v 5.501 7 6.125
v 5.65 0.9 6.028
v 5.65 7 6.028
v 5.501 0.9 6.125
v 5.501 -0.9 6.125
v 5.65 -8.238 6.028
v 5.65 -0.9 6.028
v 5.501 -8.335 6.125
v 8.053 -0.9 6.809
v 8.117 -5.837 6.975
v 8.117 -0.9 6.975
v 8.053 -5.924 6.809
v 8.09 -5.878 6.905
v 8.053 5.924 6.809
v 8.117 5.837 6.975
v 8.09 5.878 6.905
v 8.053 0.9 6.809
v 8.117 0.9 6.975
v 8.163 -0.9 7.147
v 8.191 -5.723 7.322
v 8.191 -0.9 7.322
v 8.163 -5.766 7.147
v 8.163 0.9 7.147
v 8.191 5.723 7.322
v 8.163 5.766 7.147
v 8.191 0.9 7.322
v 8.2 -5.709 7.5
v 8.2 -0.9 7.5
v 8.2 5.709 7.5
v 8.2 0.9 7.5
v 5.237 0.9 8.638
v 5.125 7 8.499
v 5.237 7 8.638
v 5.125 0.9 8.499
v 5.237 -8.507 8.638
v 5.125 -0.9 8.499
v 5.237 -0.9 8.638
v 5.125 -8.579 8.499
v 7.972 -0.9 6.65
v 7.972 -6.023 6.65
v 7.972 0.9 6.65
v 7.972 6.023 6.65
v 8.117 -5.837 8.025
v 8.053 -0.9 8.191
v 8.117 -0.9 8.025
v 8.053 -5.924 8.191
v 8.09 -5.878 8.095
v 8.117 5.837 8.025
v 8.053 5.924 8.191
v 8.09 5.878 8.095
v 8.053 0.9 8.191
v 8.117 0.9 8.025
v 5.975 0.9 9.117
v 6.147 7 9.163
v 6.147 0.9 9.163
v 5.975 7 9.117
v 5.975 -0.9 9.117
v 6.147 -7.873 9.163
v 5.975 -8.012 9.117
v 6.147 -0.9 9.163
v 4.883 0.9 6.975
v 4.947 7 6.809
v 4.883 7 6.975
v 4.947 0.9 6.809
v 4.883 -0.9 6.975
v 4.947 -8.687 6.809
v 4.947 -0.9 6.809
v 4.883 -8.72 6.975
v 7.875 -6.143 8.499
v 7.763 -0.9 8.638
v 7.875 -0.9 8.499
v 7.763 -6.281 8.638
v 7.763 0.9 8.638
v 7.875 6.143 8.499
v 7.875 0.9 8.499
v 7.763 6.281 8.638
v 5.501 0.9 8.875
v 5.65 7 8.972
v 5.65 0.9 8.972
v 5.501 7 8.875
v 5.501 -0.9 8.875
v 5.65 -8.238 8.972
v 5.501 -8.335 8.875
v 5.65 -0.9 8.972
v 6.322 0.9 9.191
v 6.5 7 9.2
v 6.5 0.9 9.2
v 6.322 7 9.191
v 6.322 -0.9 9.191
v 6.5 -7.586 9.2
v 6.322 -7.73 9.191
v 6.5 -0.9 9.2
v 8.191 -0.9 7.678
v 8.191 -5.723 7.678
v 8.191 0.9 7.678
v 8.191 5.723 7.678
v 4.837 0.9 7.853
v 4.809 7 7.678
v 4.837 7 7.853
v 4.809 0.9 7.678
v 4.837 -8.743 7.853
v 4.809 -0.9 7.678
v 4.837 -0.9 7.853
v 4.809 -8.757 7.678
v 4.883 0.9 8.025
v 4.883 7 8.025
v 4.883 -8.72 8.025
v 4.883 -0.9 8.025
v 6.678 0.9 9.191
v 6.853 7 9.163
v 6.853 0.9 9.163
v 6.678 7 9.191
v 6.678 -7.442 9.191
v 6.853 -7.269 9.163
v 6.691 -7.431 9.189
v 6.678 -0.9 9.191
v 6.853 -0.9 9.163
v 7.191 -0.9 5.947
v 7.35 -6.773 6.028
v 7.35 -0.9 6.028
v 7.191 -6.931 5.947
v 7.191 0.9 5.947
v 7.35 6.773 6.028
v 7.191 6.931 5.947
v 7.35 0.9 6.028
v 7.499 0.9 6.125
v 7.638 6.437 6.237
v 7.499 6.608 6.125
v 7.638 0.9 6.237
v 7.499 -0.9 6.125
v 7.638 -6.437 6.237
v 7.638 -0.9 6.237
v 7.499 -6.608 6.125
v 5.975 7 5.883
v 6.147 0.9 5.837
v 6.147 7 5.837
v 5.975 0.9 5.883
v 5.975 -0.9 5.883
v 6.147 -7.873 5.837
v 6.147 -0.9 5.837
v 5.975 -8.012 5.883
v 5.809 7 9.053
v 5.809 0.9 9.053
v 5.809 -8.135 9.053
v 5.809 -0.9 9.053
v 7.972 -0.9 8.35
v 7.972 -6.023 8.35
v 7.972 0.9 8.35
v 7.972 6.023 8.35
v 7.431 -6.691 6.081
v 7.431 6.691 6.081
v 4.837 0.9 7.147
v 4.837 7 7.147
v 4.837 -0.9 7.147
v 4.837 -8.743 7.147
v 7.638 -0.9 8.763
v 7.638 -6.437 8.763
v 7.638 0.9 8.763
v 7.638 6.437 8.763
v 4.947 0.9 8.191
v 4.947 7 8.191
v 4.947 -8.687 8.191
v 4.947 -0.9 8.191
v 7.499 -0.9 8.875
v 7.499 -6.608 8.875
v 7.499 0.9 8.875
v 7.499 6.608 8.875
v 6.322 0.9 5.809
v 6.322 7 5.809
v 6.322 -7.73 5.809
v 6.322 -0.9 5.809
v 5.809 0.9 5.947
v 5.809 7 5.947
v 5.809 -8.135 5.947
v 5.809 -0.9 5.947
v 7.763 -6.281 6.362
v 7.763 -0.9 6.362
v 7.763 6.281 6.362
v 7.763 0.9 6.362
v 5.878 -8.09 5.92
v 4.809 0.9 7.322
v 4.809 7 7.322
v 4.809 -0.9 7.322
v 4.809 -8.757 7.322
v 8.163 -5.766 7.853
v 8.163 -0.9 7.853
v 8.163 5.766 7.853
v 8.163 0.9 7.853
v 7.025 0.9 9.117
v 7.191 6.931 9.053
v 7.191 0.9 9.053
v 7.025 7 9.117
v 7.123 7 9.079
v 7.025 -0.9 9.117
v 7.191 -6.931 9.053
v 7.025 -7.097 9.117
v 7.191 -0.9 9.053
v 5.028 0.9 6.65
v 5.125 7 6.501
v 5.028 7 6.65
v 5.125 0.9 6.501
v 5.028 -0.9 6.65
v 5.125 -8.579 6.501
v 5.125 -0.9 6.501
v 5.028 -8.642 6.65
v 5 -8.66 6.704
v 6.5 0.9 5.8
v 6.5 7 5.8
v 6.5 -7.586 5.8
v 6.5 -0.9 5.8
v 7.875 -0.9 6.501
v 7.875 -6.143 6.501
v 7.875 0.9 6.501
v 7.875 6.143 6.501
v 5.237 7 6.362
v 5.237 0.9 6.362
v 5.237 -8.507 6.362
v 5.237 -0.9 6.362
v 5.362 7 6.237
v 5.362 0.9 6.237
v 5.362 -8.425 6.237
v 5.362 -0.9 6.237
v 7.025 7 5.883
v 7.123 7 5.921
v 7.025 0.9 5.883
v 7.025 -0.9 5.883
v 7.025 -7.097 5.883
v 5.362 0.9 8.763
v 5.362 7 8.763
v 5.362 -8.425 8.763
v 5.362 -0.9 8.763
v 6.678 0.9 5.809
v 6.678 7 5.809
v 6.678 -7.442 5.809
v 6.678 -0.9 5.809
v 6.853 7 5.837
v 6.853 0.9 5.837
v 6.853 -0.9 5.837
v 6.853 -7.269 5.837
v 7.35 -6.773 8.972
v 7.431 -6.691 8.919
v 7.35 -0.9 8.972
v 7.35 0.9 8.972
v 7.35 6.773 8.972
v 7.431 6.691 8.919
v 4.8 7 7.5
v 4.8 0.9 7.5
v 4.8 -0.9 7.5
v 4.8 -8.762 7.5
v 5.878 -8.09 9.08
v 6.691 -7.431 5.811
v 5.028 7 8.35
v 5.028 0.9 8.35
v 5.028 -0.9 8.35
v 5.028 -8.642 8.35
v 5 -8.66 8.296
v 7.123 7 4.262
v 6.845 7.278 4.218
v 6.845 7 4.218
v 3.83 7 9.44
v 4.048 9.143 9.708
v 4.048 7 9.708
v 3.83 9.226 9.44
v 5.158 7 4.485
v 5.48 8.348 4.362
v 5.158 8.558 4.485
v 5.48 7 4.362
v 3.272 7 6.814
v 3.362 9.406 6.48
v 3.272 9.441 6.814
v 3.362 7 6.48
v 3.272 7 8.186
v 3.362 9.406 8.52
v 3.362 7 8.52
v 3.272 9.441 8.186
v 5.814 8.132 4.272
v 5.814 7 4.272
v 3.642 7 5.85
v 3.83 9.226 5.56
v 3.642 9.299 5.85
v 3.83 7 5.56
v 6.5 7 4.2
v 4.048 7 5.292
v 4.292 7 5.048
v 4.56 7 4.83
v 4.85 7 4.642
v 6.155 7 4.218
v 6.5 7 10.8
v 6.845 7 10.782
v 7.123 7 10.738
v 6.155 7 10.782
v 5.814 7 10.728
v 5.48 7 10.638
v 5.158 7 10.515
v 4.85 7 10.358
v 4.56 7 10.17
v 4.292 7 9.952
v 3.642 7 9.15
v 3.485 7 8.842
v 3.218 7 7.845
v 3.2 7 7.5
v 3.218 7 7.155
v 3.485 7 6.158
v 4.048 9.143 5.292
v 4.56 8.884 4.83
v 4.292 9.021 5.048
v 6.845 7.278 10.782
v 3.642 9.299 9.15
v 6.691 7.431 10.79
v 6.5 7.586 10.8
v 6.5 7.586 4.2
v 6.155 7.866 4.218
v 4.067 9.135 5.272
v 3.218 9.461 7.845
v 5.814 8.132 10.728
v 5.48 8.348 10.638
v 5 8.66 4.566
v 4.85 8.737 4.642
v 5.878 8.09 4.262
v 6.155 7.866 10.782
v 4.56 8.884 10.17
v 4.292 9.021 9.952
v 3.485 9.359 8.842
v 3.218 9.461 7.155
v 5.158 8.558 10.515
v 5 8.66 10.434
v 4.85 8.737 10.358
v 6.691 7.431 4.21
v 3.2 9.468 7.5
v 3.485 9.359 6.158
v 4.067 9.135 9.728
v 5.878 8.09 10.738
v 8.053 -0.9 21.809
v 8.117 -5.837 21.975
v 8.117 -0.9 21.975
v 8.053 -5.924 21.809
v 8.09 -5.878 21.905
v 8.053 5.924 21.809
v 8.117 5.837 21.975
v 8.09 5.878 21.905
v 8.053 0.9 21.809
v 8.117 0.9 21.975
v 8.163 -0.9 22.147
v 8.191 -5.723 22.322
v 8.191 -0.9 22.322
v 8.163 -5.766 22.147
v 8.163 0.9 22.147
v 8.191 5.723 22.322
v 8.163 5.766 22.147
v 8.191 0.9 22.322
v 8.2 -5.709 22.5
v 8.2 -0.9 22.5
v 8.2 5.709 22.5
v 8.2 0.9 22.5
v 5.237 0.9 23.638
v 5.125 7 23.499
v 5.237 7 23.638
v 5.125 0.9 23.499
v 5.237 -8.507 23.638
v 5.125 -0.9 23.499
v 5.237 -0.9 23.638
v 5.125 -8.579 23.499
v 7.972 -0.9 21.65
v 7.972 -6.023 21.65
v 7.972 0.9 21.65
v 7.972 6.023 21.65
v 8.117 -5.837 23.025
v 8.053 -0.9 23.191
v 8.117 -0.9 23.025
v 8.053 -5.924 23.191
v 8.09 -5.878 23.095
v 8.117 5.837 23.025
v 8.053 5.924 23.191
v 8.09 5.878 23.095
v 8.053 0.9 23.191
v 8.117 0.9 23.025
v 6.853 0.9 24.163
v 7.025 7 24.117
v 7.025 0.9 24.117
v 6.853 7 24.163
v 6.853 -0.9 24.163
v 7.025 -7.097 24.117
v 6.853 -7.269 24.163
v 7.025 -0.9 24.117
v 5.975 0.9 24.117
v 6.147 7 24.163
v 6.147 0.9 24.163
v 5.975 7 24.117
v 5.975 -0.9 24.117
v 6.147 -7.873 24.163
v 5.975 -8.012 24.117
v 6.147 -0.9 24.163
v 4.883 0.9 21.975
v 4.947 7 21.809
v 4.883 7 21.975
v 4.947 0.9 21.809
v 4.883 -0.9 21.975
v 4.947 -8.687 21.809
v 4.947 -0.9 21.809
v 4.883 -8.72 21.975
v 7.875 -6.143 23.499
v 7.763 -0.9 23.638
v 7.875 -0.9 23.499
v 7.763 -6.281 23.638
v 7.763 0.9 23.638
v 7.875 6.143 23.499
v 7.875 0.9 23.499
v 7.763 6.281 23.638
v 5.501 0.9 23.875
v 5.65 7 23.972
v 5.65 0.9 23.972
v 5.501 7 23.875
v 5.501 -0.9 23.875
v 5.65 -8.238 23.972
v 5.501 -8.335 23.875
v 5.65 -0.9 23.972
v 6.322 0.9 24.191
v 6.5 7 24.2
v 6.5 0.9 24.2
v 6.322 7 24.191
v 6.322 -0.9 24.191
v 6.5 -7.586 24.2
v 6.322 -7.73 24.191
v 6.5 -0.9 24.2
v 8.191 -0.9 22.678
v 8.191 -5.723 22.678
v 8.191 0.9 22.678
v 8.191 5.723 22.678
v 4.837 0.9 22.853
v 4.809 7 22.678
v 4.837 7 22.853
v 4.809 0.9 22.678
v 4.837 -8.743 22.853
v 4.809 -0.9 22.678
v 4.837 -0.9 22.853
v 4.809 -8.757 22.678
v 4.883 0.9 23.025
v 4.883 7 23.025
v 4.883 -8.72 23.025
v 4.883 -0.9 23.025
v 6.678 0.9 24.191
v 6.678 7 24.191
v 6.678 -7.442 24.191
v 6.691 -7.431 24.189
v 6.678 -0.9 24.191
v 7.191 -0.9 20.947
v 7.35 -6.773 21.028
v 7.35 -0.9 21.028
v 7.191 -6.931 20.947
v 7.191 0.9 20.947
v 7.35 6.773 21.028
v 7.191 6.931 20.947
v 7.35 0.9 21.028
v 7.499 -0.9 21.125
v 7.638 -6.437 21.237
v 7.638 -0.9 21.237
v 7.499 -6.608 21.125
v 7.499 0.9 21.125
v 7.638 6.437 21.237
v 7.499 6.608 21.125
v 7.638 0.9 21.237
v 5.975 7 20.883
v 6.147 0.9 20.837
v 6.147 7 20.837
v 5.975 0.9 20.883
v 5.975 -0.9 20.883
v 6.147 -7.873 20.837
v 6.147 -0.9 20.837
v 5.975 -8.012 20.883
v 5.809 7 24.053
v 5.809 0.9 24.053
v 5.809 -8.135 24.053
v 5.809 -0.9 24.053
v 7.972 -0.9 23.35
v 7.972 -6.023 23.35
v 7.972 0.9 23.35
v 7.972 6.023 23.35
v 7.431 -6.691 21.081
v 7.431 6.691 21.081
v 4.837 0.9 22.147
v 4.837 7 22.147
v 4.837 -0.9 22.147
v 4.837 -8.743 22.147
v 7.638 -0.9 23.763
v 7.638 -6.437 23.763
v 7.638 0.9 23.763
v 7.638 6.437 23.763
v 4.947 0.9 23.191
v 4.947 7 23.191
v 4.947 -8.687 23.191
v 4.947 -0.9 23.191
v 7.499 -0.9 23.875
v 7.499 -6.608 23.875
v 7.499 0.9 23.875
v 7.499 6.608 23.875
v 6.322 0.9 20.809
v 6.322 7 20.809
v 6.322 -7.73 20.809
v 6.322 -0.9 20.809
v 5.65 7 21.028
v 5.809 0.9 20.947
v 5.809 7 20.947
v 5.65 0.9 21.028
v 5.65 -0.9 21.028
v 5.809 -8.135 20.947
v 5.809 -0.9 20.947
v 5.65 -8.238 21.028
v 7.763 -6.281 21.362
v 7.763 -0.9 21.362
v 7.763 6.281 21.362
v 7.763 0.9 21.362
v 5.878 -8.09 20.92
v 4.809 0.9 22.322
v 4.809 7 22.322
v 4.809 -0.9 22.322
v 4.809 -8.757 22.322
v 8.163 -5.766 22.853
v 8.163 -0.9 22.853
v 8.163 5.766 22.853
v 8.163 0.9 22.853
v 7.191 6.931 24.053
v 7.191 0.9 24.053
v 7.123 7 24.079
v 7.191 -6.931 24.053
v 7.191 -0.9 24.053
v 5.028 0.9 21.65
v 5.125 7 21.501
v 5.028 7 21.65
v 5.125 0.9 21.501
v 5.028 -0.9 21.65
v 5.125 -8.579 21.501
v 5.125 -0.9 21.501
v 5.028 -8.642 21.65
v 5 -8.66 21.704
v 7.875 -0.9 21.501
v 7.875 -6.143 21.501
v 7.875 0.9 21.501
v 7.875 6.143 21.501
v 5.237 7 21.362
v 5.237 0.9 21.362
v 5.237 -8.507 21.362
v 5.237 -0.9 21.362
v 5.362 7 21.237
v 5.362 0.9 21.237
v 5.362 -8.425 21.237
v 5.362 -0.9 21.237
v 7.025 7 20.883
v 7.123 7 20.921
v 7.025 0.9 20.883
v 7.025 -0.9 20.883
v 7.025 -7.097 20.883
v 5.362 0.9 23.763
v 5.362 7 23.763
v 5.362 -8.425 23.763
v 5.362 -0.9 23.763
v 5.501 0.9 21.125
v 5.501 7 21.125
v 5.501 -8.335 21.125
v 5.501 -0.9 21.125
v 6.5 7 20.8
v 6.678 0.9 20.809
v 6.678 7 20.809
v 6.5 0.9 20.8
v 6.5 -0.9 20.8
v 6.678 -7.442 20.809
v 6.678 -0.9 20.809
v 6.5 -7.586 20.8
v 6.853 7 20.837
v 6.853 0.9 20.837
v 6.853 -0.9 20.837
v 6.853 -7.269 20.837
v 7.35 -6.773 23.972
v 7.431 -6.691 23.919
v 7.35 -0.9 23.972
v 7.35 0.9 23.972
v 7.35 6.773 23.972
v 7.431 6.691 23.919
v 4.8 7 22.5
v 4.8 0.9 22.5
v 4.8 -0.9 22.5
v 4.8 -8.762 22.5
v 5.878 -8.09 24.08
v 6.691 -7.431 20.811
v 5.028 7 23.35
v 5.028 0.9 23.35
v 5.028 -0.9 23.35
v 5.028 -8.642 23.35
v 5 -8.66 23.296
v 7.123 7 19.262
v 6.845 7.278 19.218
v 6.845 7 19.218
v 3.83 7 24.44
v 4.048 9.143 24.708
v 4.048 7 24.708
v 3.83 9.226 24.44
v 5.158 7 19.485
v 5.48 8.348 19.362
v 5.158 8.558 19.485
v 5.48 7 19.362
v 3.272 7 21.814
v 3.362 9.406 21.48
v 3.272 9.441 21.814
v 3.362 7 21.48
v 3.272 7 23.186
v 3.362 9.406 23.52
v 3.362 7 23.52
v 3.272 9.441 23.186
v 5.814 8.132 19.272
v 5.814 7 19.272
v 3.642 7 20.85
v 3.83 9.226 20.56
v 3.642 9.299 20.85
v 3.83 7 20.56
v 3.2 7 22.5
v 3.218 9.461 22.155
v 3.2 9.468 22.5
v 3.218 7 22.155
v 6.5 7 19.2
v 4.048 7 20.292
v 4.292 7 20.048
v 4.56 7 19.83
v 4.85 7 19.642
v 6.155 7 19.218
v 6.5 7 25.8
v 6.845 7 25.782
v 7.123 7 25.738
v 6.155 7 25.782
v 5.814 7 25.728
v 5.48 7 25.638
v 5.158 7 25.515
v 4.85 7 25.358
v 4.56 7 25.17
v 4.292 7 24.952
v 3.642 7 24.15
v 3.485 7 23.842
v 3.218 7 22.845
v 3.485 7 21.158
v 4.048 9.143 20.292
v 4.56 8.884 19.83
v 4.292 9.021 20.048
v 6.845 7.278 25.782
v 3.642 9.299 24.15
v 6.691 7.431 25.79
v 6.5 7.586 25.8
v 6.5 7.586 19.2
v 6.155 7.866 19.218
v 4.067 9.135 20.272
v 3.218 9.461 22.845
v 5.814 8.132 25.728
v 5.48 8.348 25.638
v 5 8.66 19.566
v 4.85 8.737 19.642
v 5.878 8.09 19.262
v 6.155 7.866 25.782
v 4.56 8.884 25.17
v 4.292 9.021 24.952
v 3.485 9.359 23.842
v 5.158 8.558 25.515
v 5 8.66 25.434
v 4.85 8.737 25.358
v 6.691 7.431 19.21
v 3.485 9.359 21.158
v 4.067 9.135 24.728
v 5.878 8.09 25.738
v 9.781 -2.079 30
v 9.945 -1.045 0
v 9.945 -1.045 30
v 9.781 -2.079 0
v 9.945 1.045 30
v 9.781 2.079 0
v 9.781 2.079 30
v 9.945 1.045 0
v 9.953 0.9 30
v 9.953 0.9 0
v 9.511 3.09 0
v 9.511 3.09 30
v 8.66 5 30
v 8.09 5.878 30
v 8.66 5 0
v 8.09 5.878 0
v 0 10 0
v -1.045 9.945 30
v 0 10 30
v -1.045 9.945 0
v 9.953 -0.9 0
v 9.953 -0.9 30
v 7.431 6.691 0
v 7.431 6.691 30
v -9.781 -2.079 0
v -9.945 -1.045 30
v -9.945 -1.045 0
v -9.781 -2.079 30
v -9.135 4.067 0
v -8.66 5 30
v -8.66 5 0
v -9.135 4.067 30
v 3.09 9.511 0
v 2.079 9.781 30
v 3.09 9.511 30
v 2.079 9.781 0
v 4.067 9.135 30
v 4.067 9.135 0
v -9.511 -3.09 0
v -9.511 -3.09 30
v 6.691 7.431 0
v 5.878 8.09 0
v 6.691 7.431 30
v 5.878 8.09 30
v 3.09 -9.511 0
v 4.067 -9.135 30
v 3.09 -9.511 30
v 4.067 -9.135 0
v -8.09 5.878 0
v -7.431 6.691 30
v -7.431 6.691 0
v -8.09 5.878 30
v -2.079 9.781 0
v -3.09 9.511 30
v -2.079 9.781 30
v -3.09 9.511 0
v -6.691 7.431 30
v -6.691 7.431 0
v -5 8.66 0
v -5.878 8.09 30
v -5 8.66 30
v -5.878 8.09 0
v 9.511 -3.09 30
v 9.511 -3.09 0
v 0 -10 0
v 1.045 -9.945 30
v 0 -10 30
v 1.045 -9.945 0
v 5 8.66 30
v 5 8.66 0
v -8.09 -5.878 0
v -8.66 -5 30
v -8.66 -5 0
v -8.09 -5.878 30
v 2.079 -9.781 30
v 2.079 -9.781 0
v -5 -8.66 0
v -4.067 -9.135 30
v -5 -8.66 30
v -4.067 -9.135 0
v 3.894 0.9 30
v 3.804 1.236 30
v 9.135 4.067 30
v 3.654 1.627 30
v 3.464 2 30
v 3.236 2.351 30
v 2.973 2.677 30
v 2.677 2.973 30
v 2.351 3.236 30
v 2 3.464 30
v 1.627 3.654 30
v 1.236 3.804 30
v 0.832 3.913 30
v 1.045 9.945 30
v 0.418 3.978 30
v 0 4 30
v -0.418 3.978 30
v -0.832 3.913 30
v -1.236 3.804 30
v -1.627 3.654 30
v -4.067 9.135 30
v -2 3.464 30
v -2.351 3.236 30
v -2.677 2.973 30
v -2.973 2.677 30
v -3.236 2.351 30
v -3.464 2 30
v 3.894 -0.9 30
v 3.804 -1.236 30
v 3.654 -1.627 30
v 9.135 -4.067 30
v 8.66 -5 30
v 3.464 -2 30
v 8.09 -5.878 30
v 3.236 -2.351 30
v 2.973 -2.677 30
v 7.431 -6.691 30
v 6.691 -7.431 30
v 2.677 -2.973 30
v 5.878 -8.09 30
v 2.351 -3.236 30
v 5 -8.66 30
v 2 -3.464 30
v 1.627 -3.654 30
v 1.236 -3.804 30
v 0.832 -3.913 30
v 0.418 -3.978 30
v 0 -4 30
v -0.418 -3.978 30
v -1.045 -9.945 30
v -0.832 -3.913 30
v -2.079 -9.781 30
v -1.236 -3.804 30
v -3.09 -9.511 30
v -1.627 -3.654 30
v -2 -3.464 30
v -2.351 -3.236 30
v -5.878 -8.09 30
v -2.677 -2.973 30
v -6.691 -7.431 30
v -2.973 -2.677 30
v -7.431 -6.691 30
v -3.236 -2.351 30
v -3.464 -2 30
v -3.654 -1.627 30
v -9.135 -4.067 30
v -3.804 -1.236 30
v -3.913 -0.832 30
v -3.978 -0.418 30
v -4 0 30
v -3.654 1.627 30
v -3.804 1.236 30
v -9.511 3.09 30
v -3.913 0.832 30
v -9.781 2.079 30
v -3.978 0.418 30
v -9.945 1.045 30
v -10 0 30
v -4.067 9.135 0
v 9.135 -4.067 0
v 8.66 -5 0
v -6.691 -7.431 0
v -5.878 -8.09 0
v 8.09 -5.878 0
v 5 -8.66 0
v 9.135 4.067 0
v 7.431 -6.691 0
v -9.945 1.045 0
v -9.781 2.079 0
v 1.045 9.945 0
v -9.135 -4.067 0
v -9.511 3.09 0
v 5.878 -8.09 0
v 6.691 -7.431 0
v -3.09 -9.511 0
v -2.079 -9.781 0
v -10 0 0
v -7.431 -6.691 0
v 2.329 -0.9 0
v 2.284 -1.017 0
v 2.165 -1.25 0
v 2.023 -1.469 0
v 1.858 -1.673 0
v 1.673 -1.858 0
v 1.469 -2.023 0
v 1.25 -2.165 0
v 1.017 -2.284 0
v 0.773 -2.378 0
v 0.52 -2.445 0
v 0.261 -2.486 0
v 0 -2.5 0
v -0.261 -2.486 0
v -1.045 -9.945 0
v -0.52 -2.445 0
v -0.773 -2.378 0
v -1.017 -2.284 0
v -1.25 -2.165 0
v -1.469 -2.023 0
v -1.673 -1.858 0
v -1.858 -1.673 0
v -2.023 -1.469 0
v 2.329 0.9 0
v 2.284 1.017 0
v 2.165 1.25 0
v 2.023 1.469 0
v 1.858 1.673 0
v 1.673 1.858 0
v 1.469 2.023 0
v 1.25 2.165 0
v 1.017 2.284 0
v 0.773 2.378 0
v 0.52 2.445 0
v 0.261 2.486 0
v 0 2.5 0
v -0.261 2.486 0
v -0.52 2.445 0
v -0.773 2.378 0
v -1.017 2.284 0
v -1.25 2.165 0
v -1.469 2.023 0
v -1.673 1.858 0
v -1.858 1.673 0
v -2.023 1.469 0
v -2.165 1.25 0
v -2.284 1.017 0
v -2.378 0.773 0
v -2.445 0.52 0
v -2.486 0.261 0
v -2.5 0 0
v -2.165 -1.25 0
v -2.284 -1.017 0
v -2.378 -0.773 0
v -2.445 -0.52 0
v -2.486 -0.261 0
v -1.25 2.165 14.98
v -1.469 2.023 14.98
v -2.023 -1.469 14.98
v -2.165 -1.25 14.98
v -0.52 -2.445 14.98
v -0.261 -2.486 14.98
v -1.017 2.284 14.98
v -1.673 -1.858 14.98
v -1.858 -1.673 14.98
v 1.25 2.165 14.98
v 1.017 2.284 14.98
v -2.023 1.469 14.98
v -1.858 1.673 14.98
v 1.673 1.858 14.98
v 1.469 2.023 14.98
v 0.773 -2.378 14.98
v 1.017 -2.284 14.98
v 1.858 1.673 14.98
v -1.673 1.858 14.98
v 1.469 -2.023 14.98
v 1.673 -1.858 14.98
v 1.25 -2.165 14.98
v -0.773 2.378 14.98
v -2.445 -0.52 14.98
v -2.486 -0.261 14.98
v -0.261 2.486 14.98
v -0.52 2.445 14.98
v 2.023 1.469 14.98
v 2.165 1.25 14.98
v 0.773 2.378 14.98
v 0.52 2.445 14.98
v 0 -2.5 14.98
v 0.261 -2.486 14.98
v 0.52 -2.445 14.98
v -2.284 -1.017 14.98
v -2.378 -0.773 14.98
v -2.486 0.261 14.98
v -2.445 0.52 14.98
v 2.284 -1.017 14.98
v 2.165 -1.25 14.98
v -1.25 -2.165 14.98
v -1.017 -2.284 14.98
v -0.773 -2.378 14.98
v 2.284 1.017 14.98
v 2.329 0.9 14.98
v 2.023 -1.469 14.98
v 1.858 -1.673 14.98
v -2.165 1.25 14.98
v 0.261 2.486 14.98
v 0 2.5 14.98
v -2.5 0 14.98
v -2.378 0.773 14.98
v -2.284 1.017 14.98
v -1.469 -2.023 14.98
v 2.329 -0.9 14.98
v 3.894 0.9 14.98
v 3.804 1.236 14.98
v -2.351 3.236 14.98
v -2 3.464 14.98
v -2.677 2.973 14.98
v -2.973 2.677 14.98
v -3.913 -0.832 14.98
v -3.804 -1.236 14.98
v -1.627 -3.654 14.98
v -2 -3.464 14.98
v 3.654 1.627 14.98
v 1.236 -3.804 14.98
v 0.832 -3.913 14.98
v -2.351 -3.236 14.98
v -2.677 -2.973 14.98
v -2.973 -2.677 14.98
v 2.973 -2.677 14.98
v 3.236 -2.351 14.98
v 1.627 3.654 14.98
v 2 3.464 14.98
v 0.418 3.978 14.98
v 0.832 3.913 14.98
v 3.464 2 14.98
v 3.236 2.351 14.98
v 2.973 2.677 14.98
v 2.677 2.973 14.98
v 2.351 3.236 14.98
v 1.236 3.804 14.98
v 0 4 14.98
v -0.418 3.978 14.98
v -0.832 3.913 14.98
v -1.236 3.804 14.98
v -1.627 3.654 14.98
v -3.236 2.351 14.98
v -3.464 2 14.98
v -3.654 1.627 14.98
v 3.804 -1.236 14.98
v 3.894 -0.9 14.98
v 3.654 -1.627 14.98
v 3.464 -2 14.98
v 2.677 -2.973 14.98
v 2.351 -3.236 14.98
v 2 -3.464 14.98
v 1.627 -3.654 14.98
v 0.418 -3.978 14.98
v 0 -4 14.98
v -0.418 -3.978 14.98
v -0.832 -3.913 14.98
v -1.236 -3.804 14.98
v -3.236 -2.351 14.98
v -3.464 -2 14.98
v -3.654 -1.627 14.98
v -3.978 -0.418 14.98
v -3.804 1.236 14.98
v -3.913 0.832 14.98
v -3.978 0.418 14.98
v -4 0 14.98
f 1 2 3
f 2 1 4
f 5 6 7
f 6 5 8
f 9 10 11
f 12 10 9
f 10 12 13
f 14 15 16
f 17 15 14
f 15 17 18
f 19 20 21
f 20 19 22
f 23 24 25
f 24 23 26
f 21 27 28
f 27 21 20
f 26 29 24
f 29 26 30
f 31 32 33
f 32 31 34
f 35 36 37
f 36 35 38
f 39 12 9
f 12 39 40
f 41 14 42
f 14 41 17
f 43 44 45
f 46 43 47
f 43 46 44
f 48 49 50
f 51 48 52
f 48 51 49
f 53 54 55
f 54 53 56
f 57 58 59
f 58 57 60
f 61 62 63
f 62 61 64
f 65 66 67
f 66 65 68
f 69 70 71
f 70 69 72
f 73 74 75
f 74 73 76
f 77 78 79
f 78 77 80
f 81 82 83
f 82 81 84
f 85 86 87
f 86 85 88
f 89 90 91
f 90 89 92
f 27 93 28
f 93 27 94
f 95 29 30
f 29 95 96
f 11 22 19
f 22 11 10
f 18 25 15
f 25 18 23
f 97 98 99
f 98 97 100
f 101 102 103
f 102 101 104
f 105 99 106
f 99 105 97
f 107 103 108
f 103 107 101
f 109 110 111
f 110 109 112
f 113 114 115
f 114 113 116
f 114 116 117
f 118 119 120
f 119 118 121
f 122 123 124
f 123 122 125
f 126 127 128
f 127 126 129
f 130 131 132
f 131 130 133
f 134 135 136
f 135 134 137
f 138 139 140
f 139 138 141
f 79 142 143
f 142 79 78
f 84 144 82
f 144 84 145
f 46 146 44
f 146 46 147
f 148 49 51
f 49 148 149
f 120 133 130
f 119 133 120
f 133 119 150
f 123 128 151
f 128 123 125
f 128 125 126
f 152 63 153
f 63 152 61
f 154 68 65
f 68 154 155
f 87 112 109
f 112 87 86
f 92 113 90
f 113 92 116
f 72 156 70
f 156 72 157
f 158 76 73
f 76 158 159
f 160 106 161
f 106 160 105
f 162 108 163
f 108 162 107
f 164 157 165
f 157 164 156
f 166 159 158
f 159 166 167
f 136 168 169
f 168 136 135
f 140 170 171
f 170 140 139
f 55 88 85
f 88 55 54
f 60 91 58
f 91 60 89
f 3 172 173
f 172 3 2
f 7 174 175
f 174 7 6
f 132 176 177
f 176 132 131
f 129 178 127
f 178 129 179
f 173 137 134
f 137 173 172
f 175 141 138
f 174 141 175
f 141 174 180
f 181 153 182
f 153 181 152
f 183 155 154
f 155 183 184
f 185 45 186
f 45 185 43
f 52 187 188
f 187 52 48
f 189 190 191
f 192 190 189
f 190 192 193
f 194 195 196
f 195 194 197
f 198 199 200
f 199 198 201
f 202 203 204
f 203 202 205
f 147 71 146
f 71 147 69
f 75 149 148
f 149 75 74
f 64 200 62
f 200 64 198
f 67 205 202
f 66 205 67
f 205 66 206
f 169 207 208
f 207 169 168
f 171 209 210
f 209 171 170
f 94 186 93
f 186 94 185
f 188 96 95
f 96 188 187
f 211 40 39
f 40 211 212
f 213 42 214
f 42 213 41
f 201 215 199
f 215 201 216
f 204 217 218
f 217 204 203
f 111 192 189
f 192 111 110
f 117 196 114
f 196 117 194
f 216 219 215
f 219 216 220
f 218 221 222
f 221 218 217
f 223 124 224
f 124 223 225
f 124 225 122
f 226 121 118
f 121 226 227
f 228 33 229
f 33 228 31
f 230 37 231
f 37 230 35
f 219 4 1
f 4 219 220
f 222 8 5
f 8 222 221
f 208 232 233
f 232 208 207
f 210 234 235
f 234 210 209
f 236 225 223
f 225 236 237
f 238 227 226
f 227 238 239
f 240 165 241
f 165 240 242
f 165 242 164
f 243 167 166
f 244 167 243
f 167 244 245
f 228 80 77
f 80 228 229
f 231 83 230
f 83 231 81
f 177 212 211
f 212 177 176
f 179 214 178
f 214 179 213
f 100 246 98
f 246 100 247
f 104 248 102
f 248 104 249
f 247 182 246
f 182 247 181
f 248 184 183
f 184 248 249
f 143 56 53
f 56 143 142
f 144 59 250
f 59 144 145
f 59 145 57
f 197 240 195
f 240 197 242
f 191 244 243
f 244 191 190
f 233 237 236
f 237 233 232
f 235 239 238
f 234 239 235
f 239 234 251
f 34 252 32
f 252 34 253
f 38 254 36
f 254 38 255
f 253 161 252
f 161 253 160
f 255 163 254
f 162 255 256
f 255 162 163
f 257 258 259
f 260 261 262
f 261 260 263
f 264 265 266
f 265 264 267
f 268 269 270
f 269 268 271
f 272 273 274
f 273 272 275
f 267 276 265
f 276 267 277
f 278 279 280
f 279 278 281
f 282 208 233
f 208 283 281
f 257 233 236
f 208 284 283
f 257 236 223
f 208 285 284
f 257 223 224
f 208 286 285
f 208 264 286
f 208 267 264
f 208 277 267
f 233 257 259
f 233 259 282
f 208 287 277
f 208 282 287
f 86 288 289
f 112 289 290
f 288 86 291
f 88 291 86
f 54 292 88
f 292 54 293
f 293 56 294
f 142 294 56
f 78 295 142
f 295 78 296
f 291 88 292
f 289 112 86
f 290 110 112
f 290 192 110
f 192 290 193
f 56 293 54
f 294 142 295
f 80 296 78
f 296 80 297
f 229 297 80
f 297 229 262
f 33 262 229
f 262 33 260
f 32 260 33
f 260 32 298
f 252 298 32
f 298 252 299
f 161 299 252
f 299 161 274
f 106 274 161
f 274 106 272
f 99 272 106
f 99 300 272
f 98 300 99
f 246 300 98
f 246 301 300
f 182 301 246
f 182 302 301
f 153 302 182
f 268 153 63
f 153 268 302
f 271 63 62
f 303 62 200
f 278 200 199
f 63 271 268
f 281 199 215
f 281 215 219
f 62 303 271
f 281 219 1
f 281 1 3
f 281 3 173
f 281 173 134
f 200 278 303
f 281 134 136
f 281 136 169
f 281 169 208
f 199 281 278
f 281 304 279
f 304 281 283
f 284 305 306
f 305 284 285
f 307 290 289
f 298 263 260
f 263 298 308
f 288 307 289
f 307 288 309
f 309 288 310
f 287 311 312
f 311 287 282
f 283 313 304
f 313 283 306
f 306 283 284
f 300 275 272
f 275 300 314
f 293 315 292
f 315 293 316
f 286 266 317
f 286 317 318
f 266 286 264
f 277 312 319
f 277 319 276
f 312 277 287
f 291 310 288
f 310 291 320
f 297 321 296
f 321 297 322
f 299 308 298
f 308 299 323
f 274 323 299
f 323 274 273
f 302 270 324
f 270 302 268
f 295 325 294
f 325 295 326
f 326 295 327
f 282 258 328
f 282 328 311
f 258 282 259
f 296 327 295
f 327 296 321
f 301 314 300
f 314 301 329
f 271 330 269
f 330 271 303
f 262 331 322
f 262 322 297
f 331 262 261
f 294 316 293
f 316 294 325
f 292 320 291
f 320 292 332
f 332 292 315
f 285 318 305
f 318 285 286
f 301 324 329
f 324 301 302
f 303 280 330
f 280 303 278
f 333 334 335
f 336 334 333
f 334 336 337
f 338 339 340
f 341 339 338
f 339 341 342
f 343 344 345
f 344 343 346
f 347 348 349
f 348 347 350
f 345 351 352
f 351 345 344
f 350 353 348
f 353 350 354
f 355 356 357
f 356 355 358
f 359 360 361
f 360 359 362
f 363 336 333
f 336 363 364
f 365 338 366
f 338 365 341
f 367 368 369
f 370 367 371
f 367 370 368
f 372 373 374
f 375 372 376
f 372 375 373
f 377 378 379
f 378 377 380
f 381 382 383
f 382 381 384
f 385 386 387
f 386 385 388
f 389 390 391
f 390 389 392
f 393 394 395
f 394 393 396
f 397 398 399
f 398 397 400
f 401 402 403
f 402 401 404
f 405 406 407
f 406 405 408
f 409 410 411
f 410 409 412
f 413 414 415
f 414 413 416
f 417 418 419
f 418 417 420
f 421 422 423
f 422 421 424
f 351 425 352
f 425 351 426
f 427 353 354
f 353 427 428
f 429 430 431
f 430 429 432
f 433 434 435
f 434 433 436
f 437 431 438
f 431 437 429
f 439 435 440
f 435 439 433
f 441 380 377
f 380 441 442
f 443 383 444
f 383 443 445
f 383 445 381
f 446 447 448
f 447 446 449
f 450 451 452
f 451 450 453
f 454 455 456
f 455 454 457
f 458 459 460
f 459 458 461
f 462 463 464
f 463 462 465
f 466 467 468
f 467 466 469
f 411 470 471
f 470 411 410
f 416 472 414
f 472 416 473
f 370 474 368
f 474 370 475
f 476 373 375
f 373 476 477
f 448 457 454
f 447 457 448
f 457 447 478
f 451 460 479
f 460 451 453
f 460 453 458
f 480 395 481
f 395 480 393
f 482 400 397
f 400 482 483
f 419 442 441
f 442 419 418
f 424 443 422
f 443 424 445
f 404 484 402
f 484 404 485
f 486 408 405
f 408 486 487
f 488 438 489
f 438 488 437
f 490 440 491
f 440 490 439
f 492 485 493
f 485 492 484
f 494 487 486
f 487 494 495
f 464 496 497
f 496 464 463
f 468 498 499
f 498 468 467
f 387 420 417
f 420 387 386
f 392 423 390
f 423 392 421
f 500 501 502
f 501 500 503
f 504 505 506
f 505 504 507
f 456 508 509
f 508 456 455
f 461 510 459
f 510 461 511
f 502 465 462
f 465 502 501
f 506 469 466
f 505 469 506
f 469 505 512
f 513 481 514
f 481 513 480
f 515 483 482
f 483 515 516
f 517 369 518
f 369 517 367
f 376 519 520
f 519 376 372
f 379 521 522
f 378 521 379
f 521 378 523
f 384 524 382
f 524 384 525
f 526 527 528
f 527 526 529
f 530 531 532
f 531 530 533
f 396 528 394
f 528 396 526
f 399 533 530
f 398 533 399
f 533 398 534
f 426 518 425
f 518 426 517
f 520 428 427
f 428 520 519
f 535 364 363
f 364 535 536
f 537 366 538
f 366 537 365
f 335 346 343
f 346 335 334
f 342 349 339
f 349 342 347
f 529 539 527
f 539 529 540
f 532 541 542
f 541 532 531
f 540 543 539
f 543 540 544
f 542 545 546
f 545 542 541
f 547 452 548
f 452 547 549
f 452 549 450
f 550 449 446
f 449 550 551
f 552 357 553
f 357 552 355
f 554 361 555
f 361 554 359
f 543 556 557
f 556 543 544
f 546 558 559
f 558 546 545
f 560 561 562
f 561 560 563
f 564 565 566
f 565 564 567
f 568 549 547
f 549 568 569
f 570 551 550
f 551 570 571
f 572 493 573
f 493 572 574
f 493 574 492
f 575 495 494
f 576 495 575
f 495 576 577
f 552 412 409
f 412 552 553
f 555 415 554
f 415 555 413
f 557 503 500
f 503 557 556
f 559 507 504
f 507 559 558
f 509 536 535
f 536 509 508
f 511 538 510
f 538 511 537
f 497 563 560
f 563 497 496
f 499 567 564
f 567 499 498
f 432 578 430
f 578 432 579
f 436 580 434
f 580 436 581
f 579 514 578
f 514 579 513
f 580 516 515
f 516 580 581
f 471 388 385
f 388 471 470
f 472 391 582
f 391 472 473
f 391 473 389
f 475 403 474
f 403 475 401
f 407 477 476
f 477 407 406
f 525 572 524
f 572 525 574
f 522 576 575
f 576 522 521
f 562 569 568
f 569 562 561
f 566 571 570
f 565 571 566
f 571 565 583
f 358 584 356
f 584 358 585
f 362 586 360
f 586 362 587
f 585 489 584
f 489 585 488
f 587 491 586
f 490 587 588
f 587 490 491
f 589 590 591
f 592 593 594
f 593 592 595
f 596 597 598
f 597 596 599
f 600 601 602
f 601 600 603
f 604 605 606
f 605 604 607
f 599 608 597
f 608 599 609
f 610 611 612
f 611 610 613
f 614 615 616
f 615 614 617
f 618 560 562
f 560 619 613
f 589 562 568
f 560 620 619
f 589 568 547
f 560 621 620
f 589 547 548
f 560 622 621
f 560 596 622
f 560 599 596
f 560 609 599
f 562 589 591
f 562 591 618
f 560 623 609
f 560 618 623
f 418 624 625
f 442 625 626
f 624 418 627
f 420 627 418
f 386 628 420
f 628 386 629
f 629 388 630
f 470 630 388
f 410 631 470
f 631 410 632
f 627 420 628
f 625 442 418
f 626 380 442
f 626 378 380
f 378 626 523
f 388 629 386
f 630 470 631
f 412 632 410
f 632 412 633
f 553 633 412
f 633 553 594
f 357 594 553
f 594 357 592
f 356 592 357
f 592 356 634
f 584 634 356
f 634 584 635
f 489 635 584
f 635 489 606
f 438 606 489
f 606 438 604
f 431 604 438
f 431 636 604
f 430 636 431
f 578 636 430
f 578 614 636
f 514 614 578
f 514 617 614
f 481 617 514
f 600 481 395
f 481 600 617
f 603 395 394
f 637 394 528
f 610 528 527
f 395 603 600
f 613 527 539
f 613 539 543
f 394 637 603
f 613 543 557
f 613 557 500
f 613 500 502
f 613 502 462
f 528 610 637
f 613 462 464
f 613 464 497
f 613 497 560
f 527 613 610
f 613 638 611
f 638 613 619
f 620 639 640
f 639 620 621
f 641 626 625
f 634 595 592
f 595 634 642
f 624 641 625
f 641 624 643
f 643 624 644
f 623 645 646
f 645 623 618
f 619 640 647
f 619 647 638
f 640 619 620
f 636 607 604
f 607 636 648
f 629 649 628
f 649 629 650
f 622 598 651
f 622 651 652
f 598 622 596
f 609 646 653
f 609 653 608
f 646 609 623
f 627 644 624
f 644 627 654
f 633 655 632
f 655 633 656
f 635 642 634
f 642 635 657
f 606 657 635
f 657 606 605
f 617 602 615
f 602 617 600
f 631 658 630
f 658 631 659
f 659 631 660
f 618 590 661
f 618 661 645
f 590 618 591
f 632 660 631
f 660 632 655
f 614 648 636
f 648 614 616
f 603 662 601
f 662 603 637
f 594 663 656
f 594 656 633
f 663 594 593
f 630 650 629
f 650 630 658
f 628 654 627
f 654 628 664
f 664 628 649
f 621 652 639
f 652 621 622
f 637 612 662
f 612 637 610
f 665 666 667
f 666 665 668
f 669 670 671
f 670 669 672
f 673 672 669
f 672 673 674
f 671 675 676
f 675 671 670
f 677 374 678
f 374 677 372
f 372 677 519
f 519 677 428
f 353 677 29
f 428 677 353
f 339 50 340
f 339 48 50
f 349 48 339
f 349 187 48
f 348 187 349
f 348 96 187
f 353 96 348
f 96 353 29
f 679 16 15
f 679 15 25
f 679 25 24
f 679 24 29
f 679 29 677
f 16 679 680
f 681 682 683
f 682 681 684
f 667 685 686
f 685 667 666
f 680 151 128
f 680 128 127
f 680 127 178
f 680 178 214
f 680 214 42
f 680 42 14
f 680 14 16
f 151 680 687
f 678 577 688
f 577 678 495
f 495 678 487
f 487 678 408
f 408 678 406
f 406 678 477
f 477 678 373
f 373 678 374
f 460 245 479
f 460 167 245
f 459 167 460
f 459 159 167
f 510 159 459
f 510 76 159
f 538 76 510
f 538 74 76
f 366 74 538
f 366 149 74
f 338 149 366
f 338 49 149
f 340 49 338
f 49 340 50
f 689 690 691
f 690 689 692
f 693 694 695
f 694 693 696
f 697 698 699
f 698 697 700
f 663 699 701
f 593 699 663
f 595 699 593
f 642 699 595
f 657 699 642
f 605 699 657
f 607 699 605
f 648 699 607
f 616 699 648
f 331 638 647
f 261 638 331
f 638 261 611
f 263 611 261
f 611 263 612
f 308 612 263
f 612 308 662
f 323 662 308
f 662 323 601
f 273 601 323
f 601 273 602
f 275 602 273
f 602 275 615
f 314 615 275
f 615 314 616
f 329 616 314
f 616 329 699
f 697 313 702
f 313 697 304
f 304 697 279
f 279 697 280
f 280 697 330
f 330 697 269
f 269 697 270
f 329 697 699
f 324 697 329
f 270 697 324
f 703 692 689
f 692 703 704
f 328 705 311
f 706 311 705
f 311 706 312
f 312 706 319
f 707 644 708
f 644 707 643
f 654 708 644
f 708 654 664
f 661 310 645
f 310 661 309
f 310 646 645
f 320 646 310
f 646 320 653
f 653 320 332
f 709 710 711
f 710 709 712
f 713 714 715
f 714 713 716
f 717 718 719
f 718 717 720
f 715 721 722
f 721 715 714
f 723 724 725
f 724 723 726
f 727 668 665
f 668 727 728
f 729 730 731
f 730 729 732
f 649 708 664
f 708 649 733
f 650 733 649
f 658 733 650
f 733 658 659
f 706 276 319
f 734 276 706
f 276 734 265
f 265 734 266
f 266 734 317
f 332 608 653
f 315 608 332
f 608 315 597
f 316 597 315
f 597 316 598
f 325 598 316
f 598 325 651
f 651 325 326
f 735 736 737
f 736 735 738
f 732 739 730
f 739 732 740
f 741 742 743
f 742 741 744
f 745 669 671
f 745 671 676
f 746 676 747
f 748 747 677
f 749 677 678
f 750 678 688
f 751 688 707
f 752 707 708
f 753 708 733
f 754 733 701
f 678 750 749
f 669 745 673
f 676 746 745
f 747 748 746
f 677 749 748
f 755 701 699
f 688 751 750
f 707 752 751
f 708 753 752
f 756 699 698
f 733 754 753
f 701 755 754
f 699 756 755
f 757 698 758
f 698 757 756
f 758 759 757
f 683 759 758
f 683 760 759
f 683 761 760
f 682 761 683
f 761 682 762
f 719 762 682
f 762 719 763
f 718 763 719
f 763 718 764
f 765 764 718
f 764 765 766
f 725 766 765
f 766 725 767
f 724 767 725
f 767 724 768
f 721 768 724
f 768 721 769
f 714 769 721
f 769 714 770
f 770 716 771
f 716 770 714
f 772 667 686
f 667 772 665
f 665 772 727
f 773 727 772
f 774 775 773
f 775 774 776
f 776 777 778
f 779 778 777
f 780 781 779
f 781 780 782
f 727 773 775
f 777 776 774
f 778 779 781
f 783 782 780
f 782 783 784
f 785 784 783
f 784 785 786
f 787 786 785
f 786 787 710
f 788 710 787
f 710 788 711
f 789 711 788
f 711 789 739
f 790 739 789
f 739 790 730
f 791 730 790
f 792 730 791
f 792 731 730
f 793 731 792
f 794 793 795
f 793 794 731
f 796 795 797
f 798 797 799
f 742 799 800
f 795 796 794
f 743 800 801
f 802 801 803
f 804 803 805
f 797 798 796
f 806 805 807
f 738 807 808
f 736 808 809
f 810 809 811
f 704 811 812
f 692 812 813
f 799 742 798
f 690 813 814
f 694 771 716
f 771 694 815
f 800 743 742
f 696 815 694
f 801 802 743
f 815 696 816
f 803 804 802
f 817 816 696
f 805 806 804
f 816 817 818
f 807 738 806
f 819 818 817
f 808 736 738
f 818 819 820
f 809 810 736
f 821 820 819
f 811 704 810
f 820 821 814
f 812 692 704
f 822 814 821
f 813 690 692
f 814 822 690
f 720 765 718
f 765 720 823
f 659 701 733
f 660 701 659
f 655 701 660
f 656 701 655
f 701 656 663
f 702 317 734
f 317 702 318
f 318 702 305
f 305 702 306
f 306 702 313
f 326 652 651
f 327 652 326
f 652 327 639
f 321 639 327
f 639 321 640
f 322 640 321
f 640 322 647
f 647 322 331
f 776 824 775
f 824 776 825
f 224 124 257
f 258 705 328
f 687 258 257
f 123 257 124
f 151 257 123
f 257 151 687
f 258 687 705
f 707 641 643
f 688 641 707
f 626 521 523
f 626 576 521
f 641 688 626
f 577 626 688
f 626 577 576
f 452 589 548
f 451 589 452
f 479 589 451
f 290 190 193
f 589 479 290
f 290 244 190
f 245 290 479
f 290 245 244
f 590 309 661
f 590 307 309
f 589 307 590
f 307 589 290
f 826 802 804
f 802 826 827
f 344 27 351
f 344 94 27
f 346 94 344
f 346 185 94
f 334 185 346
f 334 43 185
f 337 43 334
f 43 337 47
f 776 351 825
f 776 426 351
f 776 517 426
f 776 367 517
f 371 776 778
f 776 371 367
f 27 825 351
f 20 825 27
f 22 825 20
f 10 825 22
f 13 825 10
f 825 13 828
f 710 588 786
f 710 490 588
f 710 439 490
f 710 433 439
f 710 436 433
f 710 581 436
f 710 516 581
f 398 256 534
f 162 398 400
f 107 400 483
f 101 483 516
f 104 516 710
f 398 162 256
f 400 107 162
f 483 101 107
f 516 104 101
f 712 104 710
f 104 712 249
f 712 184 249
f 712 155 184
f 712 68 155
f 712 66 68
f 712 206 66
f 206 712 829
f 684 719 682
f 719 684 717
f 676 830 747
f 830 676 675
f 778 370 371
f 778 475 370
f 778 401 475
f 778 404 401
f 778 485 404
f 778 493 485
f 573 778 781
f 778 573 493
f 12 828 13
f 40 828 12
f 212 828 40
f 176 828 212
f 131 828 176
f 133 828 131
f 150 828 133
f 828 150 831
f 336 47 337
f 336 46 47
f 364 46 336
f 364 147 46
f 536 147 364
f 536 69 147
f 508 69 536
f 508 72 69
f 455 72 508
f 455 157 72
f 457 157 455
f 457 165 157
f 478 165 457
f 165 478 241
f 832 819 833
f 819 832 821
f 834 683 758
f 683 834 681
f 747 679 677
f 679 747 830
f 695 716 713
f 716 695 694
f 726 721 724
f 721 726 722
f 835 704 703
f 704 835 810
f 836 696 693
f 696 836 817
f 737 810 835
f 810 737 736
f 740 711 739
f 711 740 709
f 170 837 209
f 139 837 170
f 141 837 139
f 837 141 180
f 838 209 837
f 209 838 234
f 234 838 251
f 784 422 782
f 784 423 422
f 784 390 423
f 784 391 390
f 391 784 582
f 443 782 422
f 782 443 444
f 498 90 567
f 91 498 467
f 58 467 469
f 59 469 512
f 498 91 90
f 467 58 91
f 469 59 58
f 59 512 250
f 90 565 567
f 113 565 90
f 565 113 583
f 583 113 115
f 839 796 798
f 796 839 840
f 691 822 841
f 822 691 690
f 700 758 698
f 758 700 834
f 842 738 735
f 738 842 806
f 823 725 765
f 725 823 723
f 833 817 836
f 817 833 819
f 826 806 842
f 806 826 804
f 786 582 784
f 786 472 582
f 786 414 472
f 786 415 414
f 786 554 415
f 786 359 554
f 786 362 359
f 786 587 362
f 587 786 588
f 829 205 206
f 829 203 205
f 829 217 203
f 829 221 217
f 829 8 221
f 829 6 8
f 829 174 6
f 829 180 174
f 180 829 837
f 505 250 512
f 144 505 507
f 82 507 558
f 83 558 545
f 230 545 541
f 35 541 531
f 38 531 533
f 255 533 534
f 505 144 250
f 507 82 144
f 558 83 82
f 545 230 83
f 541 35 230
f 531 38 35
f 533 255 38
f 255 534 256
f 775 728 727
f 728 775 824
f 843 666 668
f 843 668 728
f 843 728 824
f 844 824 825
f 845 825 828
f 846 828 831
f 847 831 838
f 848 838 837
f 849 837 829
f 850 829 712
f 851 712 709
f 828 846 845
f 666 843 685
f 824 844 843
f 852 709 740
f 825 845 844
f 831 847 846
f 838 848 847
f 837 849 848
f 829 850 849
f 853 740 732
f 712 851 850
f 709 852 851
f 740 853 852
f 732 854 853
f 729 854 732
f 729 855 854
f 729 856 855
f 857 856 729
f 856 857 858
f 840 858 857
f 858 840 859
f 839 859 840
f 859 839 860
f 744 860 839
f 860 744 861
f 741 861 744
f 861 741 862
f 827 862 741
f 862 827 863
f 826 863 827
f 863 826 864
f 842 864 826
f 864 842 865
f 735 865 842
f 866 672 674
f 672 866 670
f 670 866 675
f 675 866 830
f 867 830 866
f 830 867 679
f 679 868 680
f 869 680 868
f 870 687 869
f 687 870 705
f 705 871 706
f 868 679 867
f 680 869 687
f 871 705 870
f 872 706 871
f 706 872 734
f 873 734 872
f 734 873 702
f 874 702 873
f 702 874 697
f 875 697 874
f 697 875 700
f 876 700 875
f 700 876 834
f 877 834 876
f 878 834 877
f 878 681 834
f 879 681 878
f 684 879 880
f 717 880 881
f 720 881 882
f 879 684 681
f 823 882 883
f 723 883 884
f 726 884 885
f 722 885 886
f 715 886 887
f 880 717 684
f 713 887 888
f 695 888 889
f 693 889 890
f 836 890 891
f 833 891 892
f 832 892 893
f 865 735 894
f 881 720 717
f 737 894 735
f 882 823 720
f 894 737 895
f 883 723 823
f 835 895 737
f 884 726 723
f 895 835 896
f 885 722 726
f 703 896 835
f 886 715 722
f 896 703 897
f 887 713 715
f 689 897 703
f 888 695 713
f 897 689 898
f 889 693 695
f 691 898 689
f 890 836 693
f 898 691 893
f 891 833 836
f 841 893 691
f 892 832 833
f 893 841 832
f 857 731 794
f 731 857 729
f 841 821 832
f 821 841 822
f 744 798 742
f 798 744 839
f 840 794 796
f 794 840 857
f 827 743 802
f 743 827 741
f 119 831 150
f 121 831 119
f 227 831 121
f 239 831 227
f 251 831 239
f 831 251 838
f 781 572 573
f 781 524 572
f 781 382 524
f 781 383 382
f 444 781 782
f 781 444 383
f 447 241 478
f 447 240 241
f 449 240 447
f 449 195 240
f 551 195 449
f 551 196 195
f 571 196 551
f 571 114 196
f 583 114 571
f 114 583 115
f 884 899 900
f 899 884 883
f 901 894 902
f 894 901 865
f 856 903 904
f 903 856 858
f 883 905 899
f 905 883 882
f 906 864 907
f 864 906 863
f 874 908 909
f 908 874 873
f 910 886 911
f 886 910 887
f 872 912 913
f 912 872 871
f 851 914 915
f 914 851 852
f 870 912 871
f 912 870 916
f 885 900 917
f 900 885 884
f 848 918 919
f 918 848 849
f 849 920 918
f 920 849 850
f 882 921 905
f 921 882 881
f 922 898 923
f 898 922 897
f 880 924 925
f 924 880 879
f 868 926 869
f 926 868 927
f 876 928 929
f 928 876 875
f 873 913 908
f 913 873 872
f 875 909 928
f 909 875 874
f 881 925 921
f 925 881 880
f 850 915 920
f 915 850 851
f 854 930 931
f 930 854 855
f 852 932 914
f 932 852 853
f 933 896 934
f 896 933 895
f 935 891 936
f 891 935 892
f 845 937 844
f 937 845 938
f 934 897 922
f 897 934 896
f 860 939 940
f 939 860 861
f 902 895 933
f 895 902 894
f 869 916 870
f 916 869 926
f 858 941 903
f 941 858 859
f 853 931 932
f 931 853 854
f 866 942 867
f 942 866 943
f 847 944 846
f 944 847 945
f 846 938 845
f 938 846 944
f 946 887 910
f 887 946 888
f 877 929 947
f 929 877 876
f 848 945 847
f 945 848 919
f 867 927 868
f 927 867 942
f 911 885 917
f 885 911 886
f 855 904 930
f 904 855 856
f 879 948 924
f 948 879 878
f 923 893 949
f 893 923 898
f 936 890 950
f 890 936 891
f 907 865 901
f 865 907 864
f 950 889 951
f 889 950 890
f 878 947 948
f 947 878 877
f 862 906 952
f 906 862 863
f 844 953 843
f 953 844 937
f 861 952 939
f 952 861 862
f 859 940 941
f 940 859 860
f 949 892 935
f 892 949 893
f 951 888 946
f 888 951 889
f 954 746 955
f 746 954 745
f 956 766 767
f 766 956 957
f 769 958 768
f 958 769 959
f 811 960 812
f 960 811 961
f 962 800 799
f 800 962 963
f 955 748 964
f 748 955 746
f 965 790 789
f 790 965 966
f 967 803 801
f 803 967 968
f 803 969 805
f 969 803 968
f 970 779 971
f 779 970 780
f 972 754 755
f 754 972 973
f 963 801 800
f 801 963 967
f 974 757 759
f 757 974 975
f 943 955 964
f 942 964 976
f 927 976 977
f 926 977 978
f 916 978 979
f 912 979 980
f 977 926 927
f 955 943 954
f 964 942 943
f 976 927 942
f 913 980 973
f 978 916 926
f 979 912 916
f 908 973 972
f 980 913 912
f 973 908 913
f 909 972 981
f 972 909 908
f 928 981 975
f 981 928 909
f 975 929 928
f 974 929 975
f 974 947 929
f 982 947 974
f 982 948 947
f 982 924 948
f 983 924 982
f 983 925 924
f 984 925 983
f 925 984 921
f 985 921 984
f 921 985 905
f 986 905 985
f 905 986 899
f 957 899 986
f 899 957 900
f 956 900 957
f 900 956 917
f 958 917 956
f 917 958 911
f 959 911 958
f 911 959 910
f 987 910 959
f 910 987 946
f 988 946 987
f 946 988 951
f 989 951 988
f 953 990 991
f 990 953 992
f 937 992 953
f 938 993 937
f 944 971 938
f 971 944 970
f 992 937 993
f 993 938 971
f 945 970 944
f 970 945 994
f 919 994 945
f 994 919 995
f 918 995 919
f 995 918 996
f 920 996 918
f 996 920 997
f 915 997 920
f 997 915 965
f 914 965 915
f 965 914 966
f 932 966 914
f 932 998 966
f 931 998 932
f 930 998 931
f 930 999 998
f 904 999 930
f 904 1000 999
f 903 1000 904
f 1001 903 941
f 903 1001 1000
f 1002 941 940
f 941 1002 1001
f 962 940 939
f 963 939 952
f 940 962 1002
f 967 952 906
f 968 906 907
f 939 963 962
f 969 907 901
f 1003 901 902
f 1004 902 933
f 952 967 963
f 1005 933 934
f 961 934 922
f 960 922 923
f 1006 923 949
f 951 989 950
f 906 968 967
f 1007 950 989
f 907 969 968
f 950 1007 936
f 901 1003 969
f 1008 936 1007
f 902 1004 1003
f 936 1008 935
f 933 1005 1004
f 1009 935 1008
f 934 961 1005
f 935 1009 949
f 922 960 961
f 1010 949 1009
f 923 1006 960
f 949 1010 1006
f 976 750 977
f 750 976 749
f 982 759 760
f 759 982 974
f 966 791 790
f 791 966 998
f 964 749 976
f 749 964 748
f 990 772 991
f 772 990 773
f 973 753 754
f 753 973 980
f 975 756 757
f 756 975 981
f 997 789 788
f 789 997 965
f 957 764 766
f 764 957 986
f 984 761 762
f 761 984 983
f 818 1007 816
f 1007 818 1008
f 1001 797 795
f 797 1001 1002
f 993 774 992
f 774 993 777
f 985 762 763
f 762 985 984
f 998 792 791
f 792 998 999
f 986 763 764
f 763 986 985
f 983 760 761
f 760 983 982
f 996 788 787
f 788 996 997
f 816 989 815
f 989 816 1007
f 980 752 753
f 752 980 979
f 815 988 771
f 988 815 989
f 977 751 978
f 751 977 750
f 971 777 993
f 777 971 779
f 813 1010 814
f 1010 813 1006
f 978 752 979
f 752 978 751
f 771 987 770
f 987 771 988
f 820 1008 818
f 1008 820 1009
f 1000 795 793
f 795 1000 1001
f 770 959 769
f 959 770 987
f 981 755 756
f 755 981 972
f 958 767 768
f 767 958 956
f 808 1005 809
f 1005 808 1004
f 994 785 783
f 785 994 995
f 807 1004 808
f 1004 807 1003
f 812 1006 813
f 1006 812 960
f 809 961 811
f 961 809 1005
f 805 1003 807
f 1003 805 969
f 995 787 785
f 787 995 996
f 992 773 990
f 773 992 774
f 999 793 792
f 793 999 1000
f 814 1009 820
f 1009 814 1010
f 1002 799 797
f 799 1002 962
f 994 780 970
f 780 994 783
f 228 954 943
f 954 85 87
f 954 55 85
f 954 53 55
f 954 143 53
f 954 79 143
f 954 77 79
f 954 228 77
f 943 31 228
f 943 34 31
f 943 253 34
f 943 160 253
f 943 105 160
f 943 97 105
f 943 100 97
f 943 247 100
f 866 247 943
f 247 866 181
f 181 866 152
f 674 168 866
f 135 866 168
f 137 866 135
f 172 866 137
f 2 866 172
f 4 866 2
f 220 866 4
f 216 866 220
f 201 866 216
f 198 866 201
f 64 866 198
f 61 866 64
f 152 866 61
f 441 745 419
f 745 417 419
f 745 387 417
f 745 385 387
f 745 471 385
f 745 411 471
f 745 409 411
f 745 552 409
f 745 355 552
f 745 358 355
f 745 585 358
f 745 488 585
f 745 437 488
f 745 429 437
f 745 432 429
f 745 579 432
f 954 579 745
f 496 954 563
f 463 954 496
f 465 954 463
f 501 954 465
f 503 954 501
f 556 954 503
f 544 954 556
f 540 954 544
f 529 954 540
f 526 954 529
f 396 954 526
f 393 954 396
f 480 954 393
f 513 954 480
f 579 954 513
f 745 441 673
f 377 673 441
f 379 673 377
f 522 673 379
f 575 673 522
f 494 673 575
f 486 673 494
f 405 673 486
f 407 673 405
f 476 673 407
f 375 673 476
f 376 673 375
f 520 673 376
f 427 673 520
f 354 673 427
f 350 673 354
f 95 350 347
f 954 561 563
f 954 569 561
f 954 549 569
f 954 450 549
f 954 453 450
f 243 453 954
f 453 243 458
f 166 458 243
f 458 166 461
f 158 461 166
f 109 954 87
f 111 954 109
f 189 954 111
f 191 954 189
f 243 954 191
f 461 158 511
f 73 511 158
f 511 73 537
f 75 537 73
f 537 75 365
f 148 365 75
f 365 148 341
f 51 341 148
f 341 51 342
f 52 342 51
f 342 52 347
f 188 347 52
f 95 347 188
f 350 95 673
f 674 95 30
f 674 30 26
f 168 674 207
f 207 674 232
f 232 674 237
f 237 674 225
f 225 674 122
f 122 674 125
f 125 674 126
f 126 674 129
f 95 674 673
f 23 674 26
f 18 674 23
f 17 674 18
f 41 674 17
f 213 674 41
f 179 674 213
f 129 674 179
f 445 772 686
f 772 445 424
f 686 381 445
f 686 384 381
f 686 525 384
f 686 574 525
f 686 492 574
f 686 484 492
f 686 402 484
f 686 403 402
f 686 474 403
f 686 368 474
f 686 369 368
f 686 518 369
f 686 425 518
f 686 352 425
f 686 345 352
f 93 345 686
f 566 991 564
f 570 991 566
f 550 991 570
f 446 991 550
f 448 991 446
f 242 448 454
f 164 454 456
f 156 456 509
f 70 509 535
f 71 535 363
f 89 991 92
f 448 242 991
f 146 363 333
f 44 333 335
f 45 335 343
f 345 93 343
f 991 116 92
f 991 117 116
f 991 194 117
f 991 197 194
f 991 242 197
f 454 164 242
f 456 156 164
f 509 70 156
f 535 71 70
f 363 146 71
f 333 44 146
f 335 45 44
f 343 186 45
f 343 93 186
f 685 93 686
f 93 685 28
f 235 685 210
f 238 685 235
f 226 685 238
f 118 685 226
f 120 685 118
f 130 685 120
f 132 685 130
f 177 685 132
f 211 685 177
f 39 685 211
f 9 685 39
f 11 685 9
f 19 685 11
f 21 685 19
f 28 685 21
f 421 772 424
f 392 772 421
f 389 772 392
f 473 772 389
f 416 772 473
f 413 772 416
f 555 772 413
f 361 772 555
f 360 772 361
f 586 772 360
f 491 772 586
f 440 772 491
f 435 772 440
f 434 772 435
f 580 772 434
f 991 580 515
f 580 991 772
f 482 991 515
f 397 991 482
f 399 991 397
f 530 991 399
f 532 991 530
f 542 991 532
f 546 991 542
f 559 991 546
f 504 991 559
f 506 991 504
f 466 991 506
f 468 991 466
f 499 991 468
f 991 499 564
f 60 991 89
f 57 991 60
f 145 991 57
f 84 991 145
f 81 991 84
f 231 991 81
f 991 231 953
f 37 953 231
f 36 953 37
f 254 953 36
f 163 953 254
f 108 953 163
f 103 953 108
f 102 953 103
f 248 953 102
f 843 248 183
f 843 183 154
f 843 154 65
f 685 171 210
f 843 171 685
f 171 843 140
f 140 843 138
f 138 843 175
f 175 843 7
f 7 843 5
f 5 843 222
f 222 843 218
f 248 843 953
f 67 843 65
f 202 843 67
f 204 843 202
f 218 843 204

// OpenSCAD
// Split coupling 5x8 compact
// One-piece split coupling for 5 mm and 8 mm shafts; clamp slots are fully through-cut.
$fn = 60;
eps = 0.02;
shaft_a_d = 5;
shaft_b_d = 8;
outer_d = 20;
length = 30;
slot_w = 1.8;
clamp_screw_d = 3.4;
head_recess_d = 6.6;
head_recess_depth = 3;

module clamp_screw(z_pos) {
    translate([outer_d / 2 - 3.5, -outer_d / 2 - eps, z_pos])
        rotate([-90, 0, 0]) cylinder(d = clamp_screw_d, h = outer_d + 2 * eps);
    translate([outer_d / 2 - 3.5, outer_d / 2 - head_recess_depth, z_pos])
        rotate([-90, 0, 0]) cylinder(d = head_recess_d, h = head_recess_depth + eps);
}

difference() {
    cylinder(d = outer_d, h = length);
    translate([0, 0, -eps]) cylinder(d = shaft_a_d, h = length / 2 + eps);
    translate([0, 0, length / 2 - eps]) cylinder(d = shaft_b_d, h = length / 2 + eps);
    translate([0, -slot_w / 2, -eps]) cube([outer_d / 2 + eps, slot_w, length + 2 * eps]);
    clamp_screw(length / 4);
    clamp_screw(3 * length / 4);
}
